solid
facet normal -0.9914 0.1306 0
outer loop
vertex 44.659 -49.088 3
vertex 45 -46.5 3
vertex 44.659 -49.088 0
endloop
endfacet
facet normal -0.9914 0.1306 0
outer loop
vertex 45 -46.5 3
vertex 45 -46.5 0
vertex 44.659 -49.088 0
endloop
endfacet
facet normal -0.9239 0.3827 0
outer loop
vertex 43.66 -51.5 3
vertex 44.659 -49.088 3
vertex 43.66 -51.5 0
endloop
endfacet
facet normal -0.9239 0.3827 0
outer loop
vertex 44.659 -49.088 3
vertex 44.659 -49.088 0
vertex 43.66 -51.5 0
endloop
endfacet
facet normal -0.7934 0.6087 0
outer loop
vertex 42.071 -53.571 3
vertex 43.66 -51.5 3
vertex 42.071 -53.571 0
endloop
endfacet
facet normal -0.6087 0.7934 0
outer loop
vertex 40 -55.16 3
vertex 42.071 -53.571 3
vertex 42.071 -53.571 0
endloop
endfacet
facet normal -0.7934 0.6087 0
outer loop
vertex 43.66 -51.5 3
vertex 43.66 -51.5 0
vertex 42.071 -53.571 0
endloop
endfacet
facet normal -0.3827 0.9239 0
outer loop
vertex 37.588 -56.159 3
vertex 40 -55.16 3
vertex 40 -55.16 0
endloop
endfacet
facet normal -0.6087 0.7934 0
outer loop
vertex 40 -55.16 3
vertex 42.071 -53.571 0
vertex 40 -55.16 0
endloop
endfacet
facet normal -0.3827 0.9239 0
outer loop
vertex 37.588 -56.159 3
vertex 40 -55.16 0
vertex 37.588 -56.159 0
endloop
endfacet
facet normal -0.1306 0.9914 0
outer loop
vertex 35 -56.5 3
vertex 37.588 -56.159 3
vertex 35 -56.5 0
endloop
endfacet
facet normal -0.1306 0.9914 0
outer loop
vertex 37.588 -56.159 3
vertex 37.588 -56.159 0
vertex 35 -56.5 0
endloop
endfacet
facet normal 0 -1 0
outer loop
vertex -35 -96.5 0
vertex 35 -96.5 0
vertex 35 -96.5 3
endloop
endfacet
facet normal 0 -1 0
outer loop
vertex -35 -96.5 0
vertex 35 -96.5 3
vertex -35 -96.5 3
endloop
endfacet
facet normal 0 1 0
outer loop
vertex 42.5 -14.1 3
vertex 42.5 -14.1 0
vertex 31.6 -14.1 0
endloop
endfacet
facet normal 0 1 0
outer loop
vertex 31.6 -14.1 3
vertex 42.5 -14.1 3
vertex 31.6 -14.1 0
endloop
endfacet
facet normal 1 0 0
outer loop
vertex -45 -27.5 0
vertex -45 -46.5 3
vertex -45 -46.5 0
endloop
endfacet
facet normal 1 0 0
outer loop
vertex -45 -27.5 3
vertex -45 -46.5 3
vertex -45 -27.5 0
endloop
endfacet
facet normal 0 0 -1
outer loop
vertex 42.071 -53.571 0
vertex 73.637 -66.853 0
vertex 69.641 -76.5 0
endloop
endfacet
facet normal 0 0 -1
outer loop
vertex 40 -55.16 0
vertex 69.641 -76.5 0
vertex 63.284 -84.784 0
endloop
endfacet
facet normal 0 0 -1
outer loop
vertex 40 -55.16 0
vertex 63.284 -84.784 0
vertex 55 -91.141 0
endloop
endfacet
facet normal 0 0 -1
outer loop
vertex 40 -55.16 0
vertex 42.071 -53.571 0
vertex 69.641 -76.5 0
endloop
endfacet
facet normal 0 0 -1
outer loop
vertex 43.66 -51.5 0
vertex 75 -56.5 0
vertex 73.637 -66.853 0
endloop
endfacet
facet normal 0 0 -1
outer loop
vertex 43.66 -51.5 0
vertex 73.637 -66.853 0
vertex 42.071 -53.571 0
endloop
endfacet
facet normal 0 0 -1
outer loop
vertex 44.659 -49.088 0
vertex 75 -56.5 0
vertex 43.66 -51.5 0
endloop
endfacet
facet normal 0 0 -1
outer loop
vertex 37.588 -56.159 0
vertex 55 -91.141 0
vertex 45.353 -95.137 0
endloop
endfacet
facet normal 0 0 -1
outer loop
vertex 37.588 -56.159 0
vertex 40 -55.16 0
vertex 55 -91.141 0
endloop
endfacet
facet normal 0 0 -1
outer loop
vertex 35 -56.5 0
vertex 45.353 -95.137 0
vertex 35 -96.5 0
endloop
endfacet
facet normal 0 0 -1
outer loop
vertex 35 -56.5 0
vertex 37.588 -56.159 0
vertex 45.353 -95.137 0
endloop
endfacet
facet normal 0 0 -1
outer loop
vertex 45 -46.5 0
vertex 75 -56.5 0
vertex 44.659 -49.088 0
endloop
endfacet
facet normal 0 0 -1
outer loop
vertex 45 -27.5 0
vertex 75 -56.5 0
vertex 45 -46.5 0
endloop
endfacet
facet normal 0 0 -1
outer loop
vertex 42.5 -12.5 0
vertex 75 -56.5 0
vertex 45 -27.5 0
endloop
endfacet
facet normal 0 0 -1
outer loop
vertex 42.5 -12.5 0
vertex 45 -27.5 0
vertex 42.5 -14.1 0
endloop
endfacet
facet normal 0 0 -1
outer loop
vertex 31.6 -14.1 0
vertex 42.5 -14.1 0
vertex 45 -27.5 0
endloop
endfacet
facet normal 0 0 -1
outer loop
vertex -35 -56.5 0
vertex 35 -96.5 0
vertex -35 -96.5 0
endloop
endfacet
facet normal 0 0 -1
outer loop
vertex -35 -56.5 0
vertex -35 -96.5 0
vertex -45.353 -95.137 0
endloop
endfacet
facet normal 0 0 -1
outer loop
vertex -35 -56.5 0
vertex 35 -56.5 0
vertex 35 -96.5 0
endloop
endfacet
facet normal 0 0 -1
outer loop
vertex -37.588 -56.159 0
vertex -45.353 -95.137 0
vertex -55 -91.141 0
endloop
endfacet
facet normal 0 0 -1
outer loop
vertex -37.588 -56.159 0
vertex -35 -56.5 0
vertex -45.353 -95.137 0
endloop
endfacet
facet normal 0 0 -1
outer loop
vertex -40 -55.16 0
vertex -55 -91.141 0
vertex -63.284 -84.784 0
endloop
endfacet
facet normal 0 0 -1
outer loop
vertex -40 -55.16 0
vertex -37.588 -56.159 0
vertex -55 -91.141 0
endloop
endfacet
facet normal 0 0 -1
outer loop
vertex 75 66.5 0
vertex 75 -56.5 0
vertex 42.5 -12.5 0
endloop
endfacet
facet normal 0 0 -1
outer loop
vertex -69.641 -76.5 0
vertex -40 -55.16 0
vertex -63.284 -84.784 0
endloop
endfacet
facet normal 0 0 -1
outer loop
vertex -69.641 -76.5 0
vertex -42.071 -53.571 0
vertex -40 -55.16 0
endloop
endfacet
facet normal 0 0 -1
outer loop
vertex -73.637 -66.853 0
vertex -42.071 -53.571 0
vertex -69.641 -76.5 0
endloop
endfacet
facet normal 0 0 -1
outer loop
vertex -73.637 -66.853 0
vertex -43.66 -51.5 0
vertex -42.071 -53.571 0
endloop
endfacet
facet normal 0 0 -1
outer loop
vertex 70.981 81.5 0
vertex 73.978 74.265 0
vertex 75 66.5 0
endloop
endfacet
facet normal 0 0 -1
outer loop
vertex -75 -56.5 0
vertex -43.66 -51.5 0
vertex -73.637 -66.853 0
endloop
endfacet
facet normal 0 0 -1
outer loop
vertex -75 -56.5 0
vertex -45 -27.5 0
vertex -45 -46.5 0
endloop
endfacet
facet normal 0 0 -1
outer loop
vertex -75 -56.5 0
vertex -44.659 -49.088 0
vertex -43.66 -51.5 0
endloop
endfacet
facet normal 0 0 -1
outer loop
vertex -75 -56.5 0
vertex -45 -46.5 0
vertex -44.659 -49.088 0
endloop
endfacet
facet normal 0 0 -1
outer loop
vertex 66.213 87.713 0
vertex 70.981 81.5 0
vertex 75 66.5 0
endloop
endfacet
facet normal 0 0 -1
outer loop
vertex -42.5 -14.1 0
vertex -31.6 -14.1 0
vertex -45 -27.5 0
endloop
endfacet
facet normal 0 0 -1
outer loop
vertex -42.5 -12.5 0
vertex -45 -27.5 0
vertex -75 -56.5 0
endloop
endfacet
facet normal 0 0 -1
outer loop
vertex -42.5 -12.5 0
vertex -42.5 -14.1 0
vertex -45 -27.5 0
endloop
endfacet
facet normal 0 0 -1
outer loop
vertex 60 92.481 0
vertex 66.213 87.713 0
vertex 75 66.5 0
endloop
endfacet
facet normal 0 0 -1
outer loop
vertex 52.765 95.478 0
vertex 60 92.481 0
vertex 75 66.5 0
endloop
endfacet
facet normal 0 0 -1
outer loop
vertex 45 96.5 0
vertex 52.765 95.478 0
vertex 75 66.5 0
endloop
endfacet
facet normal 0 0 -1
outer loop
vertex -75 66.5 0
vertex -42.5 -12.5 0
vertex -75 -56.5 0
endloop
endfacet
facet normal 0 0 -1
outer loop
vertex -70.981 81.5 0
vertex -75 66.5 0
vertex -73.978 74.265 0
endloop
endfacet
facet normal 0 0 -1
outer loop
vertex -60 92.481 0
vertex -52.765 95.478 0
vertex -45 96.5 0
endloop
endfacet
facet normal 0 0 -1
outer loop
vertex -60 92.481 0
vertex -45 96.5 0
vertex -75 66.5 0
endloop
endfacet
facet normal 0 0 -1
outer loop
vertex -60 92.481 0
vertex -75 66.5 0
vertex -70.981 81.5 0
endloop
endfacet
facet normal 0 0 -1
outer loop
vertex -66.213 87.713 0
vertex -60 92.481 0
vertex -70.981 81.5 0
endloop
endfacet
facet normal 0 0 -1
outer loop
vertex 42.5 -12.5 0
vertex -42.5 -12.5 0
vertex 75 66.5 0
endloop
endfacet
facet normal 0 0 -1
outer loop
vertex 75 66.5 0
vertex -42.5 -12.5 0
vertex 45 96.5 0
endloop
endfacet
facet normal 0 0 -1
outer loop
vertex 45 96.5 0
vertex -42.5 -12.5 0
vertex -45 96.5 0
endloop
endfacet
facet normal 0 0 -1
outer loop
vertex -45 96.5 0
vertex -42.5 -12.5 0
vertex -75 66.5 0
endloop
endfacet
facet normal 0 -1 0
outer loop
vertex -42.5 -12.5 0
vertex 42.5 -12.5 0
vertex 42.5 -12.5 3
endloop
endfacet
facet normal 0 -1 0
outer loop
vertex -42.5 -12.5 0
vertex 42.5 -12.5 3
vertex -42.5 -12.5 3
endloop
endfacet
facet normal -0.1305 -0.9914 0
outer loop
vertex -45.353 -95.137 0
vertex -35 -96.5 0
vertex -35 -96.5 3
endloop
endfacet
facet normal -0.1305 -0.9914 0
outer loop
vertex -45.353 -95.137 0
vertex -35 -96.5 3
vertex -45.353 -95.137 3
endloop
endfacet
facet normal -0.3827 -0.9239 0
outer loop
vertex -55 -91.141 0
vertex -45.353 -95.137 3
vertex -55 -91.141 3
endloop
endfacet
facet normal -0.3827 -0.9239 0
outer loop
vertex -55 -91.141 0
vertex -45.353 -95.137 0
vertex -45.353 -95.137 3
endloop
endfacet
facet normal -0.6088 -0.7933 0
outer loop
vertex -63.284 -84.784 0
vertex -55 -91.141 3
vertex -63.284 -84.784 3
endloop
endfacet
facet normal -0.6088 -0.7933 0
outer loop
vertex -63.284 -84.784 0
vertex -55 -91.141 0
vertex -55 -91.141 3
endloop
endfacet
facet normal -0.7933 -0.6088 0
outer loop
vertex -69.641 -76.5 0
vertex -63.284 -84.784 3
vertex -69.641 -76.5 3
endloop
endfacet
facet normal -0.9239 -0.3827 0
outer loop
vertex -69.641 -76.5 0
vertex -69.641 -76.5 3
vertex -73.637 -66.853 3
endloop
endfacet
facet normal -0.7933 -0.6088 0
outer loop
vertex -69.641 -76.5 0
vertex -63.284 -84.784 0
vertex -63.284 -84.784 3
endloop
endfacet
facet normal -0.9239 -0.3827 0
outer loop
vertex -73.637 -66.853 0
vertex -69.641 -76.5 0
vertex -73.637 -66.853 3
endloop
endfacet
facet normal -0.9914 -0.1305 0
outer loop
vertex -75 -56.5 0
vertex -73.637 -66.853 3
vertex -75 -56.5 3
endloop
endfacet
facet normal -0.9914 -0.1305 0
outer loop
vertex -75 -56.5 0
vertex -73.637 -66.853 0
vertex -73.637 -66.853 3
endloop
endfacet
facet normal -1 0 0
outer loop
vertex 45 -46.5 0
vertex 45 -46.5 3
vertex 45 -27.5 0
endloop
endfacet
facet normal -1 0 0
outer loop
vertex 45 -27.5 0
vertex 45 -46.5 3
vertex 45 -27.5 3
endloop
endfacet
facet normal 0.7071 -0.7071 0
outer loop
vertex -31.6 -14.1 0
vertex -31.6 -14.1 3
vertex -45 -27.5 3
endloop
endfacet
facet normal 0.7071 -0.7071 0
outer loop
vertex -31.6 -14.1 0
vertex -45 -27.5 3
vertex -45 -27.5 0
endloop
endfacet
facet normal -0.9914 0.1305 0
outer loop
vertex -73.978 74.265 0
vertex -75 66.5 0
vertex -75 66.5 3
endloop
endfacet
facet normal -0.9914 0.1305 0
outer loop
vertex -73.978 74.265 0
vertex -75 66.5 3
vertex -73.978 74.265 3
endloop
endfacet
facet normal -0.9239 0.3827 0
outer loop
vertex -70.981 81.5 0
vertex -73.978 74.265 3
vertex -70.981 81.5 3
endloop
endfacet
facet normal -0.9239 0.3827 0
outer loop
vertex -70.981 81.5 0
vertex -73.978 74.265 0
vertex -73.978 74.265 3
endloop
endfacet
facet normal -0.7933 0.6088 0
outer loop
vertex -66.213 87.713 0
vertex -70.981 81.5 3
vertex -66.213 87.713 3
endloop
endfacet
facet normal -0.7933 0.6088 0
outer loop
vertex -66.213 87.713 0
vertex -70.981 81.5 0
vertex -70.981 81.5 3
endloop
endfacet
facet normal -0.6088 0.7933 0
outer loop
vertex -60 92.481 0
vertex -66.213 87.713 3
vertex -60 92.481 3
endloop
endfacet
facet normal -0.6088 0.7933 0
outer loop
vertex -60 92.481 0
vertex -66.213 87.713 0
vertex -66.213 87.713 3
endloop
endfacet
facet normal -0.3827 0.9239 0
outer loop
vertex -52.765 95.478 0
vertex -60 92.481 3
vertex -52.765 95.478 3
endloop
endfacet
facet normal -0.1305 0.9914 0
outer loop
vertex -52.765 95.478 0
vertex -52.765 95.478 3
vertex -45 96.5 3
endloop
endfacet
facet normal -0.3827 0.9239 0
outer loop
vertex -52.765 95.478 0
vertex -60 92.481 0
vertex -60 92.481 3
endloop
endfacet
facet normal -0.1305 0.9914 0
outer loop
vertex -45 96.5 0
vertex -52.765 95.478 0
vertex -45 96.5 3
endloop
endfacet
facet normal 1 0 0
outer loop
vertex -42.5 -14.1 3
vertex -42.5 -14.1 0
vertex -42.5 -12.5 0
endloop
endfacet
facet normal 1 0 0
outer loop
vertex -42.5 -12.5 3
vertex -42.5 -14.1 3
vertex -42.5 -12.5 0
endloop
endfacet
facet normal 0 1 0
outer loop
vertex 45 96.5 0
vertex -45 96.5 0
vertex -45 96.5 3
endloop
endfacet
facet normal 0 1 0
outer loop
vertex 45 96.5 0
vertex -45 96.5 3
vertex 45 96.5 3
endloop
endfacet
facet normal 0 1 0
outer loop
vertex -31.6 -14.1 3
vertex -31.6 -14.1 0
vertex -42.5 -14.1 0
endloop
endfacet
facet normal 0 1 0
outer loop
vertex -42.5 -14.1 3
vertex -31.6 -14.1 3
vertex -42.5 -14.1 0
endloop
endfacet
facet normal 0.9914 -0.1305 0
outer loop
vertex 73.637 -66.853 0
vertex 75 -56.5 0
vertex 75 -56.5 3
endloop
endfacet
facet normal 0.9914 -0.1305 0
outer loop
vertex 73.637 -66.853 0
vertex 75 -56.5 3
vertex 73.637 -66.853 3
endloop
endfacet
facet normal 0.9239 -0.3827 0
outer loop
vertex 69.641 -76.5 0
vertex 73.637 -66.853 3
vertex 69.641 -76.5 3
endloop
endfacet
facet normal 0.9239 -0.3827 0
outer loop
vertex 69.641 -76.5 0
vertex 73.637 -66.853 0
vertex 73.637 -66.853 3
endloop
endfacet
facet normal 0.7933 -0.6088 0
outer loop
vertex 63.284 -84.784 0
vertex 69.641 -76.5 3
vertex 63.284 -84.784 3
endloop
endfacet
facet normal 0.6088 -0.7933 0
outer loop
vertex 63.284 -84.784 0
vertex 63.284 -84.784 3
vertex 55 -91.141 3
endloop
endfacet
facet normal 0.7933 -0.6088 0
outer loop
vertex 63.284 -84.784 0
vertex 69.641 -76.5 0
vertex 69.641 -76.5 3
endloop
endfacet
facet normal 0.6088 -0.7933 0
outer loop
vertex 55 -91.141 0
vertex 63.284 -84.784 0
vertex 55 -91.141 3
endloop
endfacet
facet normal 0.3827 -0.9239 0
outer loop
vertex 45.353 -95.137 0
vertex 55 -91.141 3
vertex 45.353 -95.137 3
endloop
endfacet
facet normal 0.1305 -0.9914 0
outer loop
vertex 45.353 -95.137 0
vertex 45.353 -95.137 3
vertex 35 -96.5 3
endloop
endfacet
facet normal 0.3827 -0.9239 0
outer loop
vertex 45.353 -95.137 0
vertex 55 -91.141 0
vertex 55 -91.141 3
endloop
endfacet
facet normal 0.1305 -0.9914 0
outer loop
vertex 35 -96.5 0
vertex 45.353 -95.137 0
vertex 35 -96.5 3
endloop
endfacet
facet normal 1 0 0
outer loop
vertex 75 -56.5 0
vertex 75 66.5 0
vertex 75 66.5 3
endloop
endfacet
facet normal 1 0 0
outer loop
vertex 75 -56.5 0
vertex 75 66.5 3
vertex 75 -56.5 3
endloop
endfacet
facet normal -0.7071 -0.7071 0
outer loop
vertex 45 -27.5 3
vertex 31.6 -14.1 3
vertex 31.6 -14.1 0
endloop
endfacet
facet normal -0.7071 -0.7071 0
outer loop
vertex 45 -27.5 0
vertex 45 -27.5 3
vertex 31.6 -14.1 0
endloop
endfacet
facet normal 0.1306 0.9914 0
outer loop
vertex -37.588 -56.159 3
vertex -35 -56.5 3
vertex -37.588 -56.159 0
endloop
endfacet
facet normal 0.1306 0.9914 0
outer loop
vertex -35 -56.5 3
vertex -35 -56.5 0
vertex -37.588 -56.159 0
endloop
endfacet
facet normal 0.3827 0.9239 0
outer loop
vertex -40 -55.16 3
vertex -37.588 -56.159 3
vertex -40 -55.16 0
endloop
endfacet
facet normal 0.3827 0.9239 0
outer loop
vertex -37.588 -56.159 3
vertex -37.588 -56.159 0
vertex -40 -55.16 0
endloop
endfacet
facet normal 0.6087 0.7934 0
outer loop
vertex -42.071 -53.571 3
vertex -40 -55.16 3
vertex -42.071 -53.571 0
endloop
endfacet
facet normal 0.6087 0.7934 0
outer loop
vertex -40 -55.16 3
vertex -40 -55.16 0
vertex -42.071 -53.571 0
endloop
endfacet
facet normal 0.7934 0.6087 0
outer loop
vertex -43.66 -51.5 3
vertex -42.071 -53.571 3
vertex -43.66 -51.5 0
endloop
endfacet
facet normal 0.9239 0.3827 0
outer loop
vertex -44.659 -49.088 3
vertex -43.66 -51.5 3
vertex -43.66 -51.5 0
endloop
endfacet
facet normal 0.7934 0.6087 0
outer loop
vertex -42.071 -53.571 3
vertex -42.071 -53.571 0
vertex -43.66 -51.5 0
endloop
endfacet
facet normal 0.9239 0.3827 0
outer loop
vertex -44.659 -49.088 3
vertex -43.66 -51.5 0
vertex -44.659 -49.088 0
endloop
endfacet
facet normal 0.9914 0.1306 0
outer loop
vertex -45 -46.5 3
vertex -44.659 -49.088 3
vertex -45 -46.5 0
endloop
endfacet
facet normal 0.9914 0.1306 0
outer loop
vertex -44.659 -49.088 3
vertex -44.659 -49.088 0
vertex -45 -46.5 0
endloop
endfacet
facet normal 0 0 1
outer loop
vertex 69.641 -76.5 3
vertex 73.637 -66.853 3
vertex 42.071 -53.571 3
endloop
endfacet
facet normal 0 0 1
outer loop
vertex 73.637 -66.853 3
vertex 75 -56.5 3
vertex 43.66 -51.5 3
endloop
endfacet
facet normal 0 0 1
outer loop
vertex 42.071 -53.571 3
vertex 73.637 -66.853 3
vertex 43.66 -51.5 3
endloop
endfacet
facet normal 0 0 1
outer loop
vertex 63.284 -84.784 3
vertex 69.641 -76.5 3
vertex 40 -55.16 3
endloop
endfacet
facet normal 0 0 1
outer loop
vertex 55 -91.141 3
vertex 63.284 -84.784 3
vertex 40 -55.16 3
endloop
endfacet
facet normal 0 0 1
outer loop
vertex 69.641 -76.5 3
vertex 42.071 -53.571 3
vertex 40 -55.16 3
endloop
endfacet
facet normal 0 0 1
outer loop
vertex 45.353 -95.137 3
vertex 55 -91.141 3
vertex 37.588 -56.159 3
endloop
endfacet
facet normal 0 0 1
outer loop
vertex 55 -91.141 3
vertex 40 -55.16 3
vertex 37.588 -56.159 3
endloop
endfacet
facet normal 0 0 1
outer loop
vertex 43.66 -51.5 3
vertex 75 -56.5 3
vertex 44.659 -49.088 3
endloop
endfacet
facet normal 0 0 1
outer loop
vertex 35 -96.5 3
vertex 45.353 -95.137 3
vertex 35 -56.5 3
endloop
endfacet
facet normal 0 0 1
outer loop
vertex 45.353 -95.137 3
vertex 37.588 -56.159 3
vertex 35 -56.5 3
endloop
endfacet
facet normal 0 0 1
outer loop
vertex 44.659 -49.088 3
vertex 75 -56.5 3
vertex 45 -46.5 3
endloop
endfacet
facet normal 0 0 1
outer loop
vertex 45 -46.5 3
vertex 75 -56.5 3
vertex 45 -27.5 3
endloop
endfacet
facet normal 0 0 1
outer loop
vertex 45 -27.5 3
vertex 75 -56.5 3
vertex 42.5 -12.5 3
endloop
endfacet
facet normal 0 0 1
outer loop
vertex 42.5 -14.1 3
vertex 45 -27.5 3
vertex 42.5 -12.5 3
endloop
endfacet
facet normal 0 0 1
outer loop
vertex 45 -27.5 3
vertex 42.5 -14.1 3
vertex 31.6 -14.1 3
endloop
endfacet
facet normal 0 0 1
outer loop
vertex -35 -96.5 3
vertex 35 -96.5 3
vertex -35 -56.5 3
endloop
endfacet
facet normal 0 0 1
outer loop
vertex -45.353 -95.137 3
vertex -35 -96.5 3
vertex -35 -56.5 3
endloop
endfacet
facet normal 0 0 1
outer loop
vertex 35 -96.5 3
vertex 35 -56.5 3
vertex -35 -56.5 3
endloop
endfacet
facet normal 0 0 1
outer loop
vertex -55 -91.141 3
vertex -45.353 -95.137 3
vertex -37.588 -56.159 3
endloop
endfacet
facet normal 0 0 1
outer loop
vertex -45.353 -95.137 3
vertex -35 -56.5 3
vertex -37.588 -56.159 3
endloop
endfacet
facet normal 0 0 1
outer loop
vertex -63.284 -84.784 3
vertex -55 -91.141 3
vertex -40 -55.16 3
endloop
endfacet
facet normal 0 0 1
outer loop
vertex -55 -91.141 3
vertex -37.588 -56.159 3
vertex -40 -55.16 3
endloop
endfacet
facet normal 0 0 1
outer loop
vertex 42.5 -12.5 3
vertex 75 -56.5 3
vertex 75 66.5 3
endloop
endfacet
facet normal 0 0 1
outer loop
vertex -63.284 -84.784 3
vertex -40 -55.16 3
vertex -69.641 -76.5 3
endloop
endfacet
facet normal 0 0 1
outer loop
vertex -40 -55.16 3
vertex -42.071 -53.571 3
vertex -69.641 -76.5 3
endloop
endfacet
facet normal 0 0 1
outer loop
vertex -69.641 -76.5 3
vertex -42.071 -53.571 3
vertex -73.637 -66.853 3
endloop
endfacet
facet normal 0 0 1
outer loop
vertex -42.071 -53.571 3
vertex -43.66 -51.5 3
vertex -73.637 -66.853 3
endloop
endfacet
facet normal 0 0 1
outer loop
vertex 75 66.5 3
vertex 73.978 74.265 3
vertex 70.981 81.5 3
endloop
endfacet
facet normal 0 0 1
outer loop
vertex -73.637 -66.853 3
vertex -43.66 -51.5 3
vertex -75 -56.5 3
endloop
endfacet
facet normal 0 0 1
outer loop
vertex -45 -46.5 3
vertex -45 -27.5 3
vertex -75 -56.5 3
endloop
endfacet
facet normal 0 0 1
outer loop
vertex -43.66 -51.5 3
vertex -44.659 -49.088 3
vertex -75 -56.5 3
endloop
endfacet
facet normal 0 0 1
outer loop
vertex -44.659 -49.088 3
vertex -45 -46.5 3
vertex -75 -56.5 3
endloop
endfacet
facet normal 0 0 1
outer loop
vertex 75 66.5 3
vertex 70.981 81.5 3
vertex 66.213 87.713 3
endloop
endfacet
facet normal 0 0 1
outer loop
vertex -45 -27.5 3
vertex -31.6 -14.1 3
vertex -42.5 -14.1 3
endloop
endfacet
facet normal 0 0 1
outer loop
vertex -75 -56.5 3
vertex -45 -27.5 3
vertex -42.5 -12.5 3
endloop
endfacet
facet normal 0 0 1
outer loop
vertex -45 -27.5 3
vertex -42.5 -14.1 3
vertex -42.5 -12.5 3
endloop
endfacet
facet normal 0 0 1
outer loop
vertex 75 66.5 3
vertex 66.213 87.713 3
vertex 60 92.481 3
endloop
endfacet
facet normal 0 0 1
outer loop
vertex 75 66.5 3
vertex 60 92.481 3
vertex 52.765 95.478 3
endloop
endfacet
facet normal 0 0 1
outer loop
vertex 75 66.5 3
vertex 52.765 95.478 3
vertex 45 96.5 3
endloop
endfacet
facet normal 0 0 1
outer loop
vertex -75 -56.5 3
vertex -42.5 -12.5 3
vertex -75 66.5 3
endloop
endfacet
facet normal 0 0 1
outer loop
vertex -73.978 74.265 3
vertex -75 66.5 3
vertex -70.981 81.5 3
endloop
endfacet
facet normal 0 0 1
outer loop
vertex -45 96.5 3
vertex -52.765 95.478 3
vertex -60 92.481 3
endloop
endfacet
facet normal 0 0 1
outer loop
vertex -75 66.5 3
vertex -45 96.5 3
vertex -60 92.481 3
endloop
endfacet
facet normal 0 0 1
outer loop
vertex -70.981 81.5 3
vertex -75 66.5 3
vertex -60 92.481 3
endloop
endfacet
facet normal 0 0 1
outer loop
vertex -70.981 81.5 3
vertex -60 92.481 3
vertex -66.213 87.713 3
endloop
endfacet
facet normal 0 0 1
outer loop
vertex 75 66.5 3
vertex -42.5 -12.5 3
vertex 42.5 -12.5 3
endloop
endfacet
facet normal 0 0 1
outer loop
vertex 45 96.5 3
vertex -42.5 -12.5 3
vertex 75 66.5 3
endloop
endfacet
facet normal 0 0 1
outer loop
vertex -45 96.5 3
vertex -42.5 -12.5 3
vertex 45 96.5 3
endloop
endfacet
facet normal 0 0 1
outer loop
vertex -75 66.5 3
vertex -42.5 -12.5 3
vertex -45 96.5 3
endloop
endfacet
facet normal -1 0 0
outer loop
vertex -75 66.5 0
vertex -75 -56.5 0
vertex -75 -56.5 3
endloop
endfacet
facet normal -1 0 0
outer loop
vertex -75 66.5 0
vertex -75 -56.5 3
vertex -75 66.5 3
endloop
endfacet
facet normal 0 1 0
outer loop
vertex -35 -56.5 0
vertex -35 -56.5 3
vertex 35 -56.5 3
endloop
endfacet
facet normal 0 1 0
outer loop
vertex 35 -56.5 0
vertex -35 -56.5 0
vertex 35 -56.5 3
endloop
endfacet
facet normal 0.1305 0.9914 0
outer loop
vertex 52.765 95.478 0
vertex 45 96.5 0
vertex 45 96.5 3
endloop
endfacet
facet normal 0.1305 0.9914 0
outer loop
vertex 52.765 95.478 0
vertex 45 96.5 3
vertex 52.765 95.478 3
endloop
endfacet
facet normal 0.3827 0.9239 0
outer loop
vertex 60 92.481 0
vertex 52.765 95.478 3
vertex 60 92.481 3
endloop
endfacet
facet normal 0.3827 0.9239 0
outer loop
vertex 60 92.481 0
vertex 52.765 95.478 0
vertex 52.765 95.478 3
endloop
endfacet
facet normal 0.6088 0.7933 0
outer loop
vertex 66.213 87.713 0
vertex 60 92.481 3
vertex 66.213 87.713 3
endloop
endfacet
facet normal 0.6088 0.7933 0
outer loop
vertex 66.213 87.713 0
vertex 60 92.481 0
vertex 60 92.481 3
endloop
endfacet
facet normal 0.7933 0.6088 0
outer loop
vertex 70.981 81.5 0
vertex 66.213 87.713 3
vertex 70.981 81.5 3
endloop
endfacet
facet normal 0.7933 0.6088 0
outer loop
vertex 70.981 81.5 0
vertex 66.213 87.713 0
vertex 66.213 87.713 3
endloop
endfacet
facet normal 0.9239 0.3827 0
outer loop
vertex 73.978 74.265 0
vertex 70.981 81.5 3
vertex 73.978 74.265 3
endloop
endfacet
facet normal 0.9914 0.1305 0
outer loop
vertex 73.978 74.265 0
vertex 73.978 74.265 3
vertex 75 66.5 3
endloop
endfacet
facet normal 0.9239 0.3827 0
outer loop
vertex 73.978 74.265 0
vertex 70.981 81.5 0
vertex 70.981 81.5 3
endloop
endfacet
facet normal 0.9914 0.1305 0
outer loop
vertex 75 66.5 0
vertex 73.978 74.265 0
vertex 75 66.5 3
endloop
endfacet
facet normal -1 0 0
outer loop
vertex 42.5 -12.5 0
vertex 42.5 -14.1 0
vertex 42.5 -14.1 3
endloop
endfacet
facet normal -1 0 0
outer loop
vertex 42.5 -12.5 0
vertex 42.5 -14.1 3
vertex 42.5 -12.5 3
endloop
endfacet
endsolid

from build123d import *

# Parameters (mm, degrees)
BOSS_EXTRUDE1_DEPTH = 3
SKETCH2_W           = 90
SKETCH2_H           = 44
CUT_EXTRUDE1_DEPTH  = 10
FILLET1_R           = 10
CHAMFER1_SIZE       = 15
SKETCH3_W           = 85
SKETCH3_H           = 1.6
CUT_EXTRUDE2_DEPTH  = 10


with BuildPart() as part:
    # Sketch1 → Boss-Extrude1 (new body)
    with BuildSketch(Plane.XY):
        with BuildLine():
            Line((-45, 96.5), (45, 96.5))
            ThreePointArc((45, 96.5), (66.213203436, 87.713203436), (75, 66.5))
            Line((75, 66.5), (75, -56.5))
            ThreePointArc((75, -56.5), (63.284271247, -84.784271247), (35, -96.5))
            Line((35, -96.5), (0.5, -96.5))
            Line((0.5, -96.5), (-0.5, -96.5))
            Line((-0.5, -96.5), (-35, -96.5))
            ThreePointArc((-35, -96.5), (-63.284271247, -84.784271247), (-75, -56.5))
            Line((-75, -56.5), (-75, 66.5))
            ThreePointArc((-75, 66.5), (-66.213203436, 87.713203436), (-45, 96.5))
        make_face()
    extrude(amount=BOSS_EXTRUDE1_DEPTH)

    # Sketch2 → Cut-Extrude1 (cut)
    with BuildSketch(Plane.XY.offset(3)):
        with Locations((0, -34.5)):
            Rectangle(SKETCH2_W, SKETCH2_H)
    extrude(amount=-CUT_EXTRUDE1_DEPTH, mode=Mode.SUBTRACT)

    # Fillet1
    fillet1_edges = [part.edges().sort_by_distance(p)[0] for p in [
        (45, -56.5, 1.5),
        (-45, -56.5, 1.5),
    ]]
    fillet(fillet1_edges, radius=FILLET1_R)

    # Chamfer1
    chamfer1_edges = [part.edges().sort_by_distance(p)[0] for p in [
        (45, -12.5, 1.5),
        (-45, -12.5, 1.5),
    ]]
    chamfer(chamfer1_edges, length=CHAMFER1_SIZE)

    # Sketch3 → Cut-Extrude2 (cut)
    with BuildSketch(Plane(origin=(0, 0, 0), x_dir=(-1, 0, 0), z_dir=(0, 0, -1))):
        with Locations((0, -13.3)):
            Rectangle(SKETCH3_W, SKETCH3_H)
    extrude(amount=-CUT_EXTRUDE2_DEPTH, mode=Mode.SUBTRACT)


solid = part.part
